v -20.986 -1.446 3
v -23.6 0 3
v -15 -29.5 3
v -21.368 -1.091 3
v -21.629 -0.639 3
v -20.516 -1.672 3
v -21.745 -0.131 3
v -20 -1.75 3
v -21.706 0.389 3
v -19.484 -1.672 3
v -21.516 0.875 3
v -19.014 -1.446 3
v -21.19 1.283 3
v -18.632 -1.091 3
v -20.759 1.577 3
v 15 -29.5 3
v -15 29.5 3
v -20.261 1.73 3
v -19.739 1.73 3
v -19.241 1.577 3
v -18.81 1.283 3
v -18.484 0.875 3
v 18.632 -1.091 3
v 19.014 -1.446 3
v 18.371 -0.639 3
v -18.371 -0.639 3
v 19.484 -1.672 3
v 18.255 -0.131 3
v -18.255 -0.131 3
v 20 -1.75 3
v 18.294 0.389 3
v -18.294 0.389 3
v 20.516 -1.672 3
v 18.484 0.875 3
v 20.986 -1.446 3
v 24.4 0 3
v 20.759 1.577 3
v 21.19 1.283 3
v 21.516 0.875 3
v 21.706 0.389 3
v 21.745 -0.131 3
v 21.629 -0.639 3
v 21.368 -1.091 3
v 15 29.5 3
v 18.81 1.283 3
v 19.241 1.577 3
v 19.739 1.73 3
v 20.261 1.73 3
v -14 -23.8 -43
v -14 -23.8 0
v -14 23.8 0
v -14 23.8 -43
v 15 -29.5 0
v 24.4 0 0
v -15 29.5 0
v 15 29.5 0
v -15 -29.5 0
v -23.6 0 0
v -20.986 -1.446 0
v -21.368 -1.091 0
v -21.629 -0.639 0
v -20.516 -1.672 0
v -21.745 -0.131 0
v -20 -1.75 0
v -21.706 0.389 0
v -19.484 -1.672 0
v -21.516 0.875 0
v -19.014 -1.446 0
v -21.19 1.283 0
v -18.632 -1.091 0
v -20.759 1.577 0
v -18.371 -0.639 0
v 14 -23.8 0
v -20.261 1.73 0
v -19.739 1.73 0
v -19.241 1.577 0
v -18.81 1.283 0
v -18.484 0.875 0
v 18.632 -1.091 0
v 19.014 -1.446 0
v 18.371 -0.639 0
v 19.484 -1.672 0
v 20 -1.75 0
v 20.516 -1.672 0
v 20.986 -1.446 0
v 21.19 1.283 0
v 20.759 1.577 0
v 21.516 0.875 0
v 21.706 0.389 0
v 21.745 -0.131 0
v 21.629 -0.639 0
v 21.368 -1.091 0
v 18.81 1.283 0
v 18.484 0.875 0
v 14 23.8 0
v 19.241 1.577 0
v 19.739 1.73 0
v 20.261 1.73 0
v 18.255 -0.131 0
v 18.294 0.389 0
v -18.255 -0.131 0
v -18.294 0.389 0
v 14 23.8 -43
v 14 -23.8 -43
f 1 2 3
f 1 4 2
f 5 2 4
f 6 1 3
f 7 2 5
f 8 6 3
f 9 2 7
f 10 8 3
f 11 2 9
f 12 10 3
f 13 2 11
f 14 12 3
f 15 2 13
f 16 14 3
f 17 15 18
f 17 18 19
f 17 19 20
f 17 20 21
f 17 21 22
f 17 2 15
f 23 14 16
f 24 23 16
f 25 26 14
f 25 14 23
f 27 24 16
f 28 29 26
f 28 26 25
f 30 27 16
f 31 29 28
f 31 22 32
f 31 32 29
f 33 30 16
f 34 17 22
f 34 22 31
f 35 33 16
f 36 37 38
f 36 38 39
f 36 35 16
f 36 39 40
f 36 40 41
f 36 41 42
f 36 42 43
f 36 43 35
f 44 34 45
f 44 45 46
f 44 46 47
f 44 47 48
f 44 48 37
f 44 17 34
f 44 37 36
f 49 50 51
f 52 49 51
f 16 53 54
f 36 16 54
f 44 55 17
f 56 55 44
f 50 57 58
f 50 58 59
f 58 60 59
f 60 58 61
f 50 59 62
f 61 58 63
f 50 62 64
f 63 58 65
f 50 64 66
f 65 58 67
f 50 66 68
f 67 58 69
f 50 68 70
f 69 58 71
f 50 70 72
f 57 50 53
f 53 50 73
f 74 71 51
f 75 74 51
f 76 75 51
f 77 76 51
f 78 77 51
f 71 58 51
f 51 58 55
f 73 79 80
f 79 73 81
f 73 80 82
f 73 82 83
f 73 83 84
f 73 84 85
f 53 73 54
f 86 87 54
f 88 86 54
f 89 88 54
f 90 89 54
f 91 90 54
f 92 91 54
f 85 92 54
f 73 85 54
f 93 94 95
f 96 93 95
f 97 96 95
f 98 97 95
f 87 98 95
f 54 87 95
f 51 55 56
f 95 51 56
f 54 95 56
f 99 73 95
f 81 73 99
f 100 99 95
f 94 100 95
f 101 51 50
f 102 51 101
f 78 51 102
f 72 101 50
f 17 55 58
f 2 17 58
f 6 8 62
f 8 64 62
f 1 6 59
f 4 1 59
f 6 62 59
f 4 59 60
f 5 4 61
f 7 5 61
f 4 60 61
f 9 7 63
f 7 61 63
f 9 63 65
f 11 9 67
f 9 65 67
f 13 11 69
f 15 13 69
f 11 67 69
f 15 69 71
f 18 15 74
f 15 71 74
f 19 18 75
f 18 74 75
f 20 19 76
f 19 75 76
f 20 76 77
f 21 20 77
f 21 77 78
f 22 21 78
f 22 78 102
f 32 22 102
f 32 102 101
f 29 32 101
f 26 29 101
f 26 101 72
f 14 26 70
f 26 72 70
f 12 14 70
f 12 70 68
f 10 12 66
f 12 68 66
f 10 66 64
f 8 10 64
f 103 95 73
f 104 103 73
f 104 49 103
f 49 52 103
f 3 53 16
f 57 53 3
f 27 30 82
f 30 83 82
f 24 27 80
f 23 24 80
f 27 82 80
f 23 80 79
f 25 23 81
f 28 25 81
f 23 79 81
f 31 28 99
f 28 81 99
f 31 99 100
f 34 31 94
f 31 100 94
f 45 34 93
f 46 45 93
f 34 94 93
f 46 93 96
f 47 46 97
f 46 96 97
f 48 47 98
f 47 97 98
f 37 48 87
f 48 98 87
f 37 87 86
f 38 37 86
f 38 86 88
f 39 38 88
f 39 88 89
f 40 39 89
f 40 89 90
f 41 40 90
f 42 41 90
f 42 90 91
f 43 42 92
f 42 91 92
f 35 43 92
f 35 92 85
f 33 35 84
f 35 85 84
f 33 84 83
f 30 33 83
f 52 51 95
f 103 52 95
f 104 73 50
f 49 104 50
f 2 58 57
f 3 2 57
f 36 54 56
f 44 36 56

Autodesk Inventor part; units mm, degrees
ref_plane "YZ Plane" through (0, 0, 0) normal (1, 0, 0) x (0, 1, 0)
ref_plane "XZ Plane" through (0, 0, 0) normal (0, 1, 0) x (-1, 0, 0)
ref_plane "XY Plane" through (0, 0, 0) normal (0, 0, 1) x (1, 0, 0)
sketch "Skizze1" plane through (0, 0, 0) normal (0, 0, 1) x (1, 0, 0)
  line L0 (-14, -23.8) -> (-14, 23.8)
  line L1 (-14, 23.8) -> (14, 23.8)
  line L2 (14, 23.8) -> (14, -23.8)
  line L3 (14, -23.8) -> (-14, -23.8)
  line L4 (-14, -23.8) -> (14, 23.8) construction
  line L5 (-14, 23.8) -> (14, -23.8) construction
  point P0 (0, 0)
  dimension "d0" = 47.6
  dimension "d1" = 28
extrude "Extrusion1" add sketch "Skizze1" against normal blind 43
sketch "Skizze2" plane through (0, 0, 0) normal (0, 0, 1) x (1, 0, 0)
  line L0 (15, -29.5) -> (-15, -29.5)
  line L1 (-15, 29.5) -> (15, 29.5)
  line L2 (14, 23.8) -> (-14, 23.8) projected
  line L3 (-15, 29.5) -> (-23.5996, 0)
  line L4 (-23.5996, 0) -> (-15, -29.5)
  line L5 (15, -29.5) -> (24.4004, 0)
  line L6 (24.4004, 0) -> (15, 29.5)
  point P0 (0, 0)
  point P1 (0, 0)
  dimension "d4" = 5.7
  dimension "d15" = 59
  dimension "d16" = 48
  dimension "d17" = 30
extrude "Extrusion2" add sketch "Skizze2" along normal blind 3
sketch "Skizze3" plane through (0, 0, 3) normal (0, 0, 1) x (1, 0, 0)
  line L0 (15, 29.5) -> (-15, 29.5) projected
  line L1 (0, 29.5) -> (0, -29.5)
  line L2 (-15, -29.5) -> (15, -29.5) projected
  point P0 (0, 0)
  point P1 (-20, 0)
  point P2 (20, 0)
  dimension "d7" = 40
hole "Bohrung1" at (-20, 0, 3) at (20, 0, 3) direction (0, 0, -1) diameter 3.5 end through all
properties part number "Kaltstecker" material "Gummi, Silikon"
